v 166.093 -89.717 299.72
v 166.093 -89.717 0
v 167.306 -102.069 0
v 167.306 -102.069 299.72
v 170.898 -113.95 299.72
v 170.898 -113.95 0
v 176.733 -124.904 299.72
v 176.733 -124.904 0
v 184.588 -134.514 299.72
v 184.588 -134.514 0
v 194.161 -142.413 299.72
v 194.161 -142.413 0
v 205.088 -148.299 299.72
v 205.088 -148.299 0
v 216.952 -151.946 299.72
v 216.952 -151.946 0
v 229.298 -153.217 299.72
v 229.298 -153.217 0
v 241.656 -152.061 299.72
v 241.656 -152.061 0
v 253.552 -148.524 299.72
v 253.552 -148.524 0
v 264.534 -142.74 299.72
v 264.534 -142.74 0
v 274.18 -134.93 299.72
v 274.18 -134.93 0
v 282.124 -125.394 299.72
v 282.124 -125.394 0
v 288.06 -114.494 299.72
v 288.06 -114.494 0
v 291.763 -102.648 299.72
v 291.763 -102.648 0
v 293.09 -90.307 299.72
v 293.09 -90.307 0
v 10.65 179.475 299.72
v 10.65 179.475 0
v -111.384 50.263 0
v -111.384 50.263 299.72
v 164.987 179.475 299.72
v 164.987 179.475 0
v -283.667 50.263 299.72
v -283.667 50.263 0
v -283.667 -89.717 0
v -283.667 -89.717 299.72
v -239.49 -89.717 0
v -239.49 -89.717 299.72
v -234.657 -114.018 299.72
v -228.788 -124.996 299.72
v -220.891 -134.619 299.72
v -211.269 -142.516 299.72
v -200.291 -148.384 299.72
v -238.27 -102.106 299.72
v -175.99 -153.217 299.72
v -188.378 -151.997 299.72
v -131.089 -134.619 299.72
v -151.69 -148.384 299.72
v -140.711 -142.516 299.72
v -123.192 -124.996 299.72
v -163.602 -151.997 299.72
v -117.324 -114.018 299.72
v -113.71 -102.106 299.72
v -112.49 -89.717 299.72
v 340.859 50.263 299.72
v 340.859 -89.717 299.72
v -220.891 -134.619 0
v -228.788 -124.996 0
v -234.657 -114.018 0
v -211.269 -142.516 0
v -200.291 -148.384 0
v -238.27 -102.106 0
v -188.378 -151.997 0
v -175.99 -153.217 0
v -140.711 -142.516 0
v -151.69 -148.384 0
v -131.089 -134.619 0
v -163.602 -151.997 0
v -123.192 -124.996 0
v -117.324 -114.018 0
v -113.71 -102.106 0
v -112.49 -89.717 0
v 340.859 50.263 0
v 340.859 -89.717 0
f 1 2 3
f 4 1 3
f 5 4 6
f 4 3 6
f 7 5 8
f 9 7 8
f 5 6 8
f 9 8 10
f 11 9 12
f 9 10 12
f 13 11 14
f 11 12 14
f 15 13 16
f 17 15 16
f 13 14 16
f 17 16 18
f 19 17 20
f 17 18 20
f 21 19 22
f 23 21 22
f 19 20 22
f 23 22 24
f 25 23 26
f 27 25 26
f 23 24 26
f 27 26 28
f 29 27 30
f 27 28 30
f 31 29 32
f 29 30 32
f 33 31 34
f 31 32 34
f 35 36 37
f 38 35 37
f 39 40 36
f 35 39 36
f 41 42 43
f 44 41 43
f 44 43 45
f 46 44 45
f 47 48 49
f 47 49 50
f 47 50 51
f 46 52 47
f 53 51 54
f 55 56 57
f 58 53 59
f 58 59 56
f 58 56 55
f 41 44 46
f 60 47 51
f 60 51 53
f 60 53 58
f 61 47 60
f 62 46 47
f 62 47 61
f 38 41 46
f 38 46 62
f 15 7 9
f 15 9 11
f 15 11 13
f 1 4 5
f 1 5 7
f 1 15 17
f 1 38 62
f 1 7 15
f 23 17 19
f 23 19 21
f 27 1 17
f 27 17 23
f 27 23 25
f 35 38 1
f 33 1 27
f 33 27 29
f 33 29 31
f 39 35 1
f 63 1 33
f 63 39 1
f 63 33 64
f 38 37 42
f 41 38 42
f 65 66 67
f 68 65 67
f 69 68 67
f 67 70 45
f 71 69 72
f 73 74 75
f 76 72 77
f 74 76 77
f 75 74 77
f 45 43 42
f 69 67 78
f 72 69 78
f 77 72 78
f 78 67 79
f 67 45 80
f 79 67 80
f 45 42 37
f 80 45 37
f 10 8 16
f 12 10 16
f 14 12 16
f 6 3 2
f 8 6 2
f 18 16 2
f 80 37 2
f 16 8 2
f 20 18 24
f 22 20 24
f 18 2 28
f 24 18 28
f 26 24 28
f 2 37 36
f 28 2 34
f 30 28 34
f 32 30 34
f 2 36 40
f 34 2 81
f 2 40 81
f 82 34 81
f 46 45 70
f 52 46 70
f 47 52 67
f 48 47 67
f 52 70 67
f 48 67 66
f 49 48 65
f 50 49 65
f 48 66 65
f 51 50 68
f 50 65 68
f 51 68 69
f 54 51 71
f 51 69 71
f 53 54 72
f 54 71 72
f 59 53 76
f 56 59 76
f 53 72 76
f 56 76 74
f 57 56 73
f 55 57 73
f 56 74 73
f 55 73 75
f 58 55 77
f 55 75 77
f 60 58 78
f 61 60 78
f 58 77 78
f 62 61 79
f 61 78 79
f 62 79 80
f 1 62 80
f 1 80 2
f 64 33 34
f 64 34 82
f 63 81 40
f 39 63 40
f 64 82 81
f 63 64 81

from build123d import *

# Parameters (mm, degrees)
F1_DEPTH = 299.72


with BuildPart() as f1:
    # F0 (on Top) → F1 (new body)
    with BuildSketch(Plane.XY):
        with BuildLine():
            Line((-111.383964, 50.262654), (-283.667104, 50.262654))
            Line((-283.667104, 50.262654), (-283.667104, -89.717354))
            Line((-283.667104, -89.717354), (-239.49016, -89.717354))
            ThreePointArc((-239.49016, -89.717354), (-175.99016, -26.217354), (-112.49016, -89.717354))
            Line((-112.49016, -89.717354), (166.092987, -89.717354))
            ThreePointArc((166.092987, -89.717354), (229.592987, -26.217354), (293.092987, -89.717354))
            ThreePointArc((293.092987, -89.717354), (293.092302, -90.012305), (293.090247, -90.30725))
            Line((293.090247, -90.30725), (340.859073, -89.717354))
            Line((340.859073, -89.717354), (340.859073, 50.262654))
            Line((340.859073, 50.262654), (164.986756, 179.474962))
            Line((164.986756, 179.474962), (10.649873, 179.474962))
            Line((10.649873, 179.474962), (-111.383964, 50.262654))
        make_face()
        with BuildLine():
            ThreePointArc((-112.49016, -89.717354), (-175.99016, -26.217354), (-239.49016, -89.717354))
            ThreePointArc((-239.49016, -89.717354), (-175.99016, -153.217354), (-112.49016, -89.717354))
        make_face()
        with BuildLine():
            ThreePointArc((293.092987, -89.717354), (229.592987, -26.217354), (166.092987, -89.717354))
            ThreePointArc((166.092987, -89.717354), (229.298036, -153.216669), (293.090247, -90.30725))
            ThreePointArc((293.090247, -90.30725), (293.092302, -90.012305), (293.092987, -89.717354))
        make_face()
    extrude(amount=F1_DEPTH)


solid = f1.part
